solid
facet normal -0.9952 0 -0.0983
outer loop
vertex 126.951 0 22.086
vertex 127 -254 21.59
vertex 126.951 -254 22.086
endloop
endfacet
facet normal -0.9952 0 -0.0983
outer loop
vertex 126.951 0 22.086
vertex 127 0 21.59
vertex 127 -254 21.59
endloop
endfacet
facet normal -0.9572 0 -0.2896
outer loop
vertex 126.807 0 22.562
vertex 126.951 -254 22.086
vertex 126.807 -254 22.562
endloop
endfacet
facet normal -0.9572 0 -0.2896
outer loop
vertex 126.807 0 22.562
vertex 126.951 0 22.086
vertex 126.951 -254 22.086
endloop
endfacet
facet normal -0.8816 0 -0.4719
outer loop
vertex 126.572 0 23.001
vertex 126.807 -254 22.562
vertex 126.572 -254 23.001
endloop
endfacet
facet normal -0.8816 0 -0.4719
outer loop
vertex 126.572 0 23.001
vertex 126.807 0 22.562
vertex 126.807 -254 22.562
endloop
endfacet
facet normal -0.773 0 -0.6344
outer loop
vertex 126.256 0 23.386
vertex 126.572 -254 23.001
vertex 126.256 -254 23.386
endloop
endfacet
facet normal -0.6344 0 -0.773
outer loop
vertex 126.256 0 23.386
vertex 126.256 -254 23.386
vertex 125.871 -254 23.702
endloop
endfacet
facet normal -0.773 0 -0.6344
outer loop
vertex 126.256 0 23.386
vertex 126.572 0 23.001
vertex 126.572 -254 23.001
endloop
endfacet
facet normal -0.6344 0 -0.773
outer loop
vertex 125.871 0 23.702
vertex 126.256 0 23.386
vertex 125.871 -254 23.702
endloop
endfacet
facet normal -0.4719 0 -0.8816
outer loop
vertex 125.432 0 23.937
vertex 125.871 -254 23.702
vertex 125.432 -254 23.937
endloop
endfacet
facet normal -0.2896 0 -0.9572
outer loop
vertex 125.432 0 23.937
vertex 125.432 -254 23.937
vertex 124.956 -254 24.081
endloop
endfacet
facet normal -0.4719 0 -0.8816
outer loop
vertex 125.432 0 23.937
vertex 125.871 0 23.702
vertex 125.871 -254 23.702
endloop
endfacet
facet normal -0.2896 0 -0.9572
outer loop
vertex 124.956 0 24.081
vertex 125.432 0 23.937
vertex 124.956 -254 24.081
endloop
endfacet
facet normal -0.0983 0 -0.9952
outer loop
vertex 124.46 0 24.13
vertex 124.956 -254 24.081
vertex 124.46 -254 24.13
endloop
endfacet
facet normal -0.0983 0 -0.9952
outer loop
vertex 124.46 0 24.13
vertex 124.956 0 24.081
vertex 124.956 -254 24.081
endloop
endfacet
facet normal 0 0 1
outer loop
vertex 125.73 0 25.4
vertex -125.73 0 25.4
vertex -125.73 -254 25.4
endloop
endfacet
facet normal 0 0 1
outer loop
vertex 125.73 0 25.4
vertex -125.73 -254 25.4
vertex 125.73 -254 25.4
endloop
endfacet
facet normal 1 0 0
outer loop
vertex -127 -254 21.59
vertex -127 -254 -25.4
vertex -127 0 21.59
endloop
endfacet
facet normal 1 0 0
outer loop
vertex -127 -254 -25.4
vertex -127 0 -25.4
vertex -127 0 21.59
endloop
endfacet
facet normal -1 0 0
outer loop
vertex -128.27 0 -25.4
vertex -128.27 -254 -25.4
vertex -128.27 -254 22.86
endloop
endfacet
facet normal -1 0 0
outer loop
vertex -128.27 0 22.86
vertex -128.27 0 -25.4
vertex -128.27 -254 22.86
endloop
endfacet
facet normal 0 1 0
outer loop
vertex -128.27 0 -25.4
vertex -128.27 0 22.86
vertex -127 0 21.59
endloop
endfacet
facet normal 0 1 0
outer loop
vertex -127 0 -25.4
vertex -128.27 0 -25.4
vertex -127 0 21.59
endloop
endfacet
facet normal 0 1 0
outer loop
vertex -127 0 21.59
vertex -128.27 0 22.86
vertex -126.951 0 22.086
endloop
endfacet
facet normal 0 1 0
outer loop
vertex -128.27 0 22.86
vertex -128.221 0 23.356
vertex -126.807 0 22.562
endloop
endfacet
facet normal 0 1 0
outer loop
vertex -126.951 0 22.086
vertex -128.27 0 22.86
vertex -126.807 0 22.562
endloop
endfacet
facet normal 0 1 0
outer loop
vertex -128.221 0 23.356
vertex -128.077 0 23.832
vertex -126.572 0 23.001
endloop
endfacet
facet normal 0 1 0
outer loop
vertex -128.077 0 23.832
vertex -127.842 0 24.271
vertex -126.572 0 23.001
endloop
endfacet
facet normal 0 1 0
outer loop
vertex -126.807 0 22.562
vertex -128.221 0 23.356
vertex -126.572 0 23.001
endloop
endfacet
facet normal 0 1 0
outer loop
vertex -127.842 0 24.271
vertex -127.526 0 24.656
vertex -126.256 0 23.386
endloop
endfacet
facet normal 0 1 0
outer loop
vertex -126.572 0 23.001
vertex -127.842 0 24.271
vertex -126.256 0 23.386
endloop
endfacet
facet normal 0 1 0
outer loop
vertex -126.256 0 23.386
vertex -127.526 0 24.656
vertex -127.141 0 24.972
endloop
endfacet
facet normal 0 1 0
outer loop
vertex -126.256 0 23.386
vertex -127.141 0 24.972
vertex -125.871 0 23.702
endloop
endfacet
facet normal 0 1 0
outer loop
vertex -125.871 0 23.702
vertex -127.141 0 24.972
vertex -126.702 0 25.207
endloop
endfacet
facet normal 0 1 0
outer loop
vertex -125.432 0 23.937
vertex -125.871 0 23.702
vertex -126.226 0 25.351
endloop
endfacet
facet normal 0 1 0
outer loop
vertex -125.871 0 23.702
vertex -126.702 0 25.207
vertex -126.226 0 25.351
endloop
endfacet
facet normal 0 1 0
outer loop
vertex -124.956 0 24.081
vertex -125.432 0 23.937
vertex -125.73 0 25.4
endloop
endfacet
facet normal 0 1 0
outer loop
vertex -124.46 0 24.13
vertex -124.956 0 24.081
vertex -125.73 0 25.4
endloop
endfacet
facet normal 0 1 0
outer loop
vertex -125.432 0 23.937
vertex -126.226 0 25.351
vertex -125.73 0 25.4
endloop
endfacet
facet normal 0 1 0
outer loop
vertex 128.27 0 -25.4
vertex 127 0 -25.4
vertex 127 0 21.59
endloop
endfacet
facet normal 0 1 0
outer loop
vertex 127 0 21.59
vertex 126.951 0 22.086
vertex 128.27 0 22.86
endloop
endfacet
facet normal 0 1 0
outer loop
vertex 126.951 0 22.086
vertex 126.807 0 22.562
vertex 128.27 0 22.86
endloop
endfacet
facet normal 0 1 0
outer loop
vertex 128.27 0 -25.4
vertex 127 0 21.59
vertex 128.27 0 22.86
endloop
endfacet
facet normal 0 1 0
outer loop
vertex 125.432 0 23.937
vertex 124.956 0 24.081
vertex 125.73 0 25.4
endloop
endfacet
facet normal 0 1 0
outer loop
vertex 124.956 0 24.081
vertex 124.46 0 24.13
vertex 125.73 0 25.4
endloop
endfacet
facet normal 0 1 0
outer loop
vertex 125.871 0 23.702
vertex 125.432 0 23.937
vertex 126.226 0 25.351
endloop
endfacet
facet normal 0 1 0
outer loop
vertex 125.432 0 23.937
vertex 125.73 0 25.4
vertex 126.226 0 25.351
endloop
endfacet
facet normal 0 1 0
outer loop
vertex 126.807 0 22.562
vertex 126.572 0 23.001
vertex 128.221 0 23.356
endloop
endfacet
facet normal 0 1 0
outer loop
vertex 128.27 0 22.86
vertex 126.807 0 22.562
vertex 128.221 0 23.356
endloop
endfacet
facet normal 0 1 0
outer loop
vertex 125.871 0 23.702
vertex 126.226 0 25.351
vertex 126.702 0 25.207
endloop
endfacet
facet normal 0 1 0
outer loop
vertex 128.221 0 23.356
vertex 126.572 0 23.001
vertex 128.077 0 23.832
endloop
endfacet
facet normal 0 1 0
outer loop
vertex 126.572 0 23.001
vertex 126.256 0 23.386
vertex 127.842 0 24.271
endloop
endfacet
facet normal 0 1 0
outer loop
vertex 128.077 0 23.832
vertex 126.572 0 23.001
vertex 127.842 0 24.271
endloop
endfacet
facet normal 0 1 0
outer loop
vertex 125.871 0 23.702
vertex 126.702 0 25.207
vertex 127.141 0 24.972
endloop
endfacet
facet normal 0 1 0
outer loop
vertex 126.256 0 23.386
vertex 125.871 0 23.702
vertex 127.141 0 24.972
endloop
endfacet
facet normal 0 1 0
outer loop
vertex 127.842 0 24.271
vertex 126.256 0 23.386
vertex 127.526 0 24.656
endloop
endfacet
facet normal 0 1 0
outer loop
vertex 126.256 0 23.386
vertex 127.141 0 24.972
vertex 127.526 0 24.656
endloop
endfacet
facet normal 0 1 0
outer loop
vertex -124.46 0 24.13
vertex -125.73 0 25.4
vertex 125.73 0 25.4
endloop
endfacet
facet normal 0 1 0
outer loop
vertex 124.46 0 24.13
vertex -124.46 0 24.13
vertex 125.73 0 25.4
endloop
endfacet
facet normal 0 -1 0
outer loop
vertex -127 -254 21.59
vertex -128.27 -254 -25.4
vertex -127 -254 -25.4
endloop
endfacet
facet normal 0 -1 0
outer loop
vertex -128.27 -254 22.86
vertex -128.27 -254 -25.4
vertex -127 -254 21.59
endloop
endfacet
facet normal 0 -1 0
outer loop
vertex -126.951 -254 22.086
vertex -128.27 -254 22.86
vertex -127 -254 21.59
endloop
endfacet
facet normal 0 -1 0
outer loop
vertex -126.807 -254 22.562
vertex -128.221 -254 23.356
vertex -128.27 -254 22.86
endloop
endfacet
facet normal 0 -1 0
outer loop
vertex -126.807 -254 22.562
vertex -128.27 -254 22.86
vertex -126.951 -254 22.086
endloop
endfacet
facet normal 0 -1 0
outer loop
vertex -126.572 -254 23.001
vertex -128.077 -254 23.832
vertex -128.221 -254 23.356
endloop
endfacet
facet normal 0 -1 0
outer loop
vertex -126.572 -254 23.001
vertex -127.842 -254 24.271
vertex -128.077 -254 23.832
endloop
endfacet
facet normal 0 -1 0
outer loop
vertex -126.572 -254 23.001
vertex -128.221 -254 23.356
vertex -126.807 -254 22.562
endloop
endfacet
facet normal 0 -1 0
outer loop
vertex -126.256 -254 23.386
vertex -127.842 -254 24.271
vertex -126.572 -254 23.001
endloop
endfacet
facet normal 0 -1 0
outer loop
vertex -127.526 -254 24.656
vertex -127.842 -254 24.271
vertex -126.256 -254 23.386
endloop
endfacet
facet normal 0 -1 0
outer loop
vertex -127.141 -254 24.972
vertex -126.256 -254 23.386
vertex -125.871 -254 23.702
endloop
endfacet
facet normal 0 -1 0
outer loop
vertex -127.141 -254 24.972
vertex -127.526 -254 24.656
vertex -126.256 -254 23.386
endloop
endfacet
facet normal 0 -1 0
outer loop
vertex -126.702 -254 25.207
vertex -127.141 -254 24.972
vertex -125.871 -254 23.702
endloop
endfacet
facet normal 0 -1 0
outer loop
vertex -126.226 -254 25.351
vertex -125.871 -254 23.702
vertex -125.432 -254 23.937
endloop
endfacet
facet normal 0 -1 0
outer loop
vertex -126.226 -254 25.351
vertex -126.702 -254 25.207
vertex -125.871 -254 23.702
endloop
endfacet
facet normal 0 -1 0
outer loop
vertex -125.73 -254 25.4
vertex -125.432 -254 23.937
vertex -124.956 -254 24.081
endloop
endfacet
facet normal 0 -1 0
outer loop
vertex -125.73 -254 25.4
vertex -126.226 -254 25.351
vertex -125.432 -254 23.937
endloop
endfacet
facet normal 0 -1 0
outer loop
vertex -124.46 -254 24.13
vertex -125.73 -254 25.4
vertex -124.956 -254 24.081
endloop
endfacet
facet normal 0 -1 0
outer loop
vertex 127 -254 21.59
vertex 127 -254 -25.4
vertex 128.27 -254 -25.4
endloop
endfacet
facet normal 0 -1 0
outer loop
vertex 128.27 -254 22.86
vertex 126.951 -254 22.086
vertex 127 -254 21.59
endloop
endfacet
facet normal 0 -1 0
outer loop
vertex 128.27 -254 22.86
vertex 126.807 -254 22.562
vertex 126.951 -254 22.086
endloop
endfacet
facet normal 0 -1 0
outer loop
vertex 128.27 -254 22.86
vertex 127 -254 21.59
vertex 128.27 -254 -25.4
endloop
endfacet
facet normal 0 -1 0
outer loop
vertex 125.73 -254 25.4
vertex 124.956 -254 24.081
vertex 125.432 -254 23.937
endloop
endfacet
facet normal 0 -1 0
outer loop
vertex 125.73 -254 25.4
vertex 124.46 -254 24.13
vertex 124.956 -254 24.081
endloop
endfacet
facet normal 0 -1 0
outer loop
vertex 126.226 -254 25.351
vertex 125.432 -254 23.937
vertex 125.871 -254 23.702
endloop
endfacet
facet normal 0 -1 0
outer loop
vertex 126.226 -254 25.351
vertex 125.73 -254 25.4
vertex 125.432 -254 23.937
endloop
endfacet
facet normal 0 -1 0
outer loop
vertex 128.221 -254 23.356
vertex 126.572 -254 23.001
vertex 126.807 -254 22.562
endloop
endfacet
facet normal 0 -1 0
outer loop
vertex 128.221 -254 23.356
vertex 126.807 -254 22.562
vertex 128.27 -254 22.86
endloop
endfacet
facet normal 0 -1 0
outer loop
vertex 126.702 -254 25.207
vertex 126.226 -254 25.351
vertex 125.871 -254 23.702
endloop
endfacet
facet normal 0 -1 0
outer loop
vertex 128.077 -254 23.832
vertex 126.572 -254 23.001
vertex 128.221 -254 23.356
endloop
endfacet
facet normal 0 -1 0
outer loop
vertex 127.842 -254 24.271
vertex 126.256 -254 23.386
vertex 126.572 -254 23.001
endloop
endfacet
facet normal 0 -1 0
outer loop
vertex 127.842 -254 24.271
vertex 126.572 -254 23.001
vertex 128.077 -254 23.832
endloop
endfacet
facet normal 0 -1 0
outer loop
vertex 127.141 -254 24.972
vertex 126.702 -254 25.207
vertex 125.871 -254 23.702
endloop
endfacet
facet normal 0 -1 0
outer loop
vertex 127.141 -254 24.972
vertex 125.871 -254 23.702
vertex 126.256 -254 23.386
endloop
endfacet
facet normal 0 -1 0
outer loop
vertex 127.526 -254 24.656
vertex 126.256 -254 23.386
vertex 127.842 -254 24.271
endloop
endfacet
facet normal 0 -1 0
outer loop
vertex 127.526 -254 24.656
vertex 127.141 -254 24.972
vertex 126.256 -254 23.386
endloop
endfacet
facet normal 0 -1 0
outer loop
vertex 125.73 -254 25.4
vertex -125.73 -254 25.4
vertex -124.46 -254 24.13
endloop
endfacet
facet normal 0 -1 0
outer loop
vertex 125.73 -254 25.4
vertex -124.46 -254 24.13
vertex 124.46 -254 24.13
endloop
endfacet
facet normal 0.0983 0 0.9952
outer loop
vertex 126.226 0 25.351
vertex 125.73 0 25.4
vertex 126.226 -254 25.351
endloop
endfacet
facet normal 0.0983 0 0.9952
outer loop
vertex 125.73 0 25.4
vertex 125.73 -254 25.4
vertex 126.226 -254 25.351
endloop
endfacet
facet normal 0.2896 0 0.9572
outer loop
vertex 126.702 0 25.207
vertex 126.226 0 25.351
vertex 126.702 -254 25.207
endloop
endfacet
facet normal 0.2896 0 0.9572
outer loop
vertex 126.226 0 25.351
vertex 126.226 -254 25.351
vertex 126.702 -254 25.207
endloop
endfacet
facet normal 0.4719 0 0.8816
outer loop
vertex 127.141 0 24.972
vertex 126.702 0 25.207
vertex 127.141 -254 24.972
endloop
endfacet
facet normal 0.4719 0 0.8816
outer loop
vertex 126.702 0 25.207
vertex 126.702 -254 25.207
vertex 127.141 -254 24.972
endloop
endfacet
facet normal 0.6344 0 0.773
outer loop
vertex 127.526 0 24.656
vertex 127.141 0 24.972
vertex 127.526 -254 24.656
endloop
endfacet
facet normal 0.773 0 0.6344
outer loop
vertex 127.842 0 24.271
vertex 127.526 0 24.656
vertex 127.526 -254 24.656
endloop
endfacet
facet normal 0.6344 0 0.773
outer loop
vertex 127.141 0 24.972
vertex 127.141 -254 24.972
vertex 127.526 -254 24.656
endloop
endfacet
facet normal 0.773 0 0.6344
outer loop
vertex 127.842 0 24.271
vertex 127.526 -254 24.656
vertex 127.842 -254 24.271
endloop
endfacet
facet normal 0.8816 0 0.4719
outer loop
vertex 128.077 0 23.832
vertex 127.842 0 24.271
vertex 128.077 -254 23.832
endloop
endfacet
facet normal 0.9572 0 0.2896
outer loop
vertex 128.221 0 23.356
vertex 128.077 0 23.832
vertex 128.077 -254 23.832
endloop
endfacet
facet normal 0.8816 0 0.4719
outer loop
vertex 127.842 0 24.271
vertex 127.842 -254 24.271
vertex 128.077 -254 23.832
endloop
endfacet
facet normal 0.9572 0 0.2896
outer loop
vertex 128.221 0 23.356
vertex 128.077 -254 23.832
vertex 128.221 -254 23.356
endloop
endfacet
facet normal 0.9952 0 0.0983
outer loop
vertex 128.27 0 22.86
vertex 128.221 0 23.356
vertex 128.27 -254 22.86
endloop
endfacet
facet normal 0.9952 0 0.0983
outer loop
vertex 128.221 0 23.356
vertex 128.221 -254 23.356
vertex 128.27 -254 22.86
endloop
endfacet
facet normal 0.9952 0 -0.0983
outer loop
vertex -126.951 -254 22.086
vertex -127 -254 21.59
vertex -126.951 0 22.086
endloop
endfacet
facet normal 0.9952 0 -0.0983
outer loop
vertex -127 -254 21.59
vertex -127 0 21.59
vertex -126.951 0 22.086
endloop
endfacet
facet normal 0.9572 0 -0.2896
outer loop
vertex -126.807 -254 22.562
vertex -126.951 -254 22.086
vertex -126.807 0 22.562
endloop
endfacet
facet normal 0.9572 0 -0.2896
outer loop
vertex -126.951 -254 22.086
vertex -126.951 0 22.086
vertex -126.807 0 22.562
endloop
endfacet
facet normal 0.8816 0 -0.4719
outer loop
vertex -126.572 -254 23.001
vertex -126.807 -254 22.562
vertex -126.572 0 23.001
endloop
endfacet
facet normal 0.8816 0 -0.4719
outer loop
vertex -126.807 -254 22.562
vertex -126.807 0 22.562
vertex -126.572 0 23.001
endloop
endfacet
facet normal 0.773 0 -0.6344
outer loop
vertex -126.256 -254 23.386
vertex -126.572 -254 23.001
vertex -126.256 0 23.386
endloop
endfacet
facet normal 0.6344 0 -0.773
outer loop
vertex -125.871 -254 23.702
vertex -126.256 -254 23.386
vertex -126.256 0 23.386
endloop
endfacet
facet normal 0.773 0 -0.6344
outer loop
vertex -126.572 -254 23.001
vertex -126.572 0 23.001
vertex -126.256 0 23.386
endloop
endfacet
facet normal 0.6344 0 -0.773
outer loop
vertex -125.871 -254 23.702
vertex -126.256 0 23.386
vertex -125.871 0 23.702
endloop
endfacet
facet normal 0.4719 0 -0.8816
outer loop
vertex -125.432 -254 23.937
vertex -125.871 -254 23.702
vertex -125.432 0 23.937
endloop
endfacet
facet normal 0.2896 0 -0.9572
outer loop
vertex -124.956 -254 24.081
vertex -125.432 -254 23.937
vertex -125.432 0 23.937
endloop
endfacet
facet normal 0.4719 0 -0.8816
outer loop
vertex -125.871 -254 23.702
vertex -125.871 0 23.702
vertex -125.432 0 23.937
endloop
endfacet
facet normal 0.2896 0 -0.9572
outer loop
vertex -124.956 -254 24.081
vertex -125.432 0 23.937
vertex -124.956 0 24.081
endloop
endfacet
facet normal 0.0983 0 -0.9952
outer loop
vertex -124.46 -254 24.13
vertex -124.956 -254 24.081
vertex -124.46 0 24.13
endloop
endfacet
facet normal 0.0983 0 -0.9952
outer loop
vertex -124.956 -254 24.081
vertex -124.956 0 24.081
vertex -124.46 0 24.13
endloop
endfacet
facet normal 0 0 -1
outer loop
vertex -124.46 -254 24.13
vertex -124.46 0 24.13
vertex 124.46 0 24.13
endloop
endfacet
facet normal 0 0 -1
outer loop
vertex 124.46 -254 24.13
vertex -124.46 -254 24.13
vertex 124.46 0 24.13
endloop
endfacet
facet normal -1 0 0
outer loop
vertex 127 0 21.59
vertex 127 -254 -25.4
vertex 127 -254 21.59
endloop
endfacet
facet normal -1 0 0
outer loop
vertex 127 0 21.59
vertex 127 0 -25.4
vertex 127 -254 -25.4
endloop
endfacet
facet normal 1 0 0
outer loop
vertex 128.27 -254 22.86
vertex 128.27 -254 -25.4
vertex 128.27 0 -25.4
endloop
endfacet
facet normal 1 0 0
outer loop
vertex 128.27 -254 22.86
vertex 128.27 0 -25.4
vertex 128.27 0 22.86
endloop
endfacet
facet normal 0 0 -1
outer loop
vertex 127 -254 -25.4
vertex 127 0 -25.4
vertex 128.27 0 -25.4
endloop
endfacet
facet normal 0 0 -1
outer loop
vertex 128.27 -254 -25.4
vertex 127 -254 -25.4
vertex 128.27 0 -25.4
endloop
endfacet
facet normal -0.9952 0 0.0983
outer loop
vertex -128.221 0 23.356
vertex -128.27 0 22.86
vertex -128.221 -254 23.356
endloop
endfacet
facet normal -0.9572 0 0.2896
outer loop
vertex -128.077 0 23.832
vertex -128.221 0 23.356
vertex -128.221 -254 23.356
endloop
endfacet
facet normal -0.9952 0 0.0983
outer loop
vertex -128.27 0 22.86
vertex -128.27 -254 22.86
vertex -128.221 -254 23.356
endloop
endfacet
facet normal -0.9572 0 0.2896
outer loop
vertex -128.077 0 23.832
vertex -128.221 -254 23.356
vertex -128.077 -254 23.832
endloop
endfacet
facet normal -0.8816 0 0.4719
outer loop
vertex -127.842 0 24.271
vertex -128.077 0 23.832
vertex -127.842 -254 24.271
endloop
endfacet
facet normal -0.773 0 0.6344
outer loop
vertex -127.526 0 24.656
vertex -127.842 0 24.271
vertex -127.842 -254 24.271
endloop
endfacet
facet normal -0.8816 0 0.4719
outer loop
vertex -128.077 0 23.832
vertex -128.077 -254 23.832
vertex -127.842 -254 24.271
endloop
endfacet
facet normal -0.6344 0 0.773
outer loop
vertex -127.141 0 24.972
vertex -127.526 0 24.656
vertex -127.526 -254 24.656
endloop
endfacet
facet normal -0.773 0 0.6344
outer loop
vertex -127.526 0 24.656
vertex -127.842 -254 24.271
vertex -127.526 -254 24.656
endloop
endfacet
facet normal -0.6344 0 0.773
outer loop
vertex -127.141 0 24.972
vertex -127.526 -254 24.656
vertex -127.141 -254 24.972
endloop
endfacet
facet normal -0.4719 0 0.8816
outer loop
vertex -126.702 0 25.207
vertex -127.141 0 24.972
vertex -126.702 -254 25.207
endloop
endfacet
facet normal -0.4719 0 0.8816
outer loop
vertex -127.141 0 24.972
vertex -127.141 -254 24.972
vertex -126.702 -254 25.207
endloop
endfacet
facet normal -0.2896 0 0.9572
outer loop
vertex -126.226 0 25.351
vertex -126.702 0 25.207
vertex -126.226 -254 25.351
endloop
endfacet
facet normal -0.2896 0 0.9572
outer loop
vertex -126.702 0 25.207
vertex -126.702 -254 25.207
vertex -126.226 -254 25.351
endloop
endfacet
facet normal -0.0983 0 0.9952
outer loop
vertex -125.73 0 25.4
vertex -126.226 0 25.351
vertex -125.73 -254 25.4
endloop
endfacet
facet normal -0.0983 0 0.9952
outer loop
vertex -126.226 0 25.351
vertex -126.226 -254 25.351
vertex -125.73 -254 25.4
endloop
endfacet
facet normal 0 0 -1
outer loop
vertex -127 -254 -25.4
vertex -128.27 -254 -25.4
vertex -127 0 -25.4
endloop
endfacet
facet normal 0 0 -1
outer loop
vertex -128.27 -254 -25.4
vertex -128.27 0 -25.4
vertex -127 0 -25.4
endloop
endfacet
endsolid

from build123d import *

# Parameters (mm, degrees)
F0_W     = 256.54
F0_H     = 50.8
F1_DEPTH = 254
F2_T     = -1.27
F3_R     = 2.54


with BuildPart() as f1:
    # F0 (on Front) → F1 (new body)
    with BuildSketch(Plane.XZ):
        Rectangle(F0_W, F0_H)
    extrude(amount=F1_DEPTH)

    # F2
    f2_openings = [f1.faces().sort_by_distance(p)[0] for p in [
        (0, -254, 0),
        (0, -127, -25.4),
        (0, 0, 0),
    ]]
    offset(amount=F2_T, openings=f2_openings)

    # F3
    f3_edges = [f1.edges().sort_by_distance(p)[0] for p in [
        (-127, -127, 24.13),
        (127, -127, 24.13),
        (128.27, -127, 25.4),
        (-128.27, -127, 25.4),
    ]]
    fillet(f3_edges, radius=F3_R)


solid = f1.part
